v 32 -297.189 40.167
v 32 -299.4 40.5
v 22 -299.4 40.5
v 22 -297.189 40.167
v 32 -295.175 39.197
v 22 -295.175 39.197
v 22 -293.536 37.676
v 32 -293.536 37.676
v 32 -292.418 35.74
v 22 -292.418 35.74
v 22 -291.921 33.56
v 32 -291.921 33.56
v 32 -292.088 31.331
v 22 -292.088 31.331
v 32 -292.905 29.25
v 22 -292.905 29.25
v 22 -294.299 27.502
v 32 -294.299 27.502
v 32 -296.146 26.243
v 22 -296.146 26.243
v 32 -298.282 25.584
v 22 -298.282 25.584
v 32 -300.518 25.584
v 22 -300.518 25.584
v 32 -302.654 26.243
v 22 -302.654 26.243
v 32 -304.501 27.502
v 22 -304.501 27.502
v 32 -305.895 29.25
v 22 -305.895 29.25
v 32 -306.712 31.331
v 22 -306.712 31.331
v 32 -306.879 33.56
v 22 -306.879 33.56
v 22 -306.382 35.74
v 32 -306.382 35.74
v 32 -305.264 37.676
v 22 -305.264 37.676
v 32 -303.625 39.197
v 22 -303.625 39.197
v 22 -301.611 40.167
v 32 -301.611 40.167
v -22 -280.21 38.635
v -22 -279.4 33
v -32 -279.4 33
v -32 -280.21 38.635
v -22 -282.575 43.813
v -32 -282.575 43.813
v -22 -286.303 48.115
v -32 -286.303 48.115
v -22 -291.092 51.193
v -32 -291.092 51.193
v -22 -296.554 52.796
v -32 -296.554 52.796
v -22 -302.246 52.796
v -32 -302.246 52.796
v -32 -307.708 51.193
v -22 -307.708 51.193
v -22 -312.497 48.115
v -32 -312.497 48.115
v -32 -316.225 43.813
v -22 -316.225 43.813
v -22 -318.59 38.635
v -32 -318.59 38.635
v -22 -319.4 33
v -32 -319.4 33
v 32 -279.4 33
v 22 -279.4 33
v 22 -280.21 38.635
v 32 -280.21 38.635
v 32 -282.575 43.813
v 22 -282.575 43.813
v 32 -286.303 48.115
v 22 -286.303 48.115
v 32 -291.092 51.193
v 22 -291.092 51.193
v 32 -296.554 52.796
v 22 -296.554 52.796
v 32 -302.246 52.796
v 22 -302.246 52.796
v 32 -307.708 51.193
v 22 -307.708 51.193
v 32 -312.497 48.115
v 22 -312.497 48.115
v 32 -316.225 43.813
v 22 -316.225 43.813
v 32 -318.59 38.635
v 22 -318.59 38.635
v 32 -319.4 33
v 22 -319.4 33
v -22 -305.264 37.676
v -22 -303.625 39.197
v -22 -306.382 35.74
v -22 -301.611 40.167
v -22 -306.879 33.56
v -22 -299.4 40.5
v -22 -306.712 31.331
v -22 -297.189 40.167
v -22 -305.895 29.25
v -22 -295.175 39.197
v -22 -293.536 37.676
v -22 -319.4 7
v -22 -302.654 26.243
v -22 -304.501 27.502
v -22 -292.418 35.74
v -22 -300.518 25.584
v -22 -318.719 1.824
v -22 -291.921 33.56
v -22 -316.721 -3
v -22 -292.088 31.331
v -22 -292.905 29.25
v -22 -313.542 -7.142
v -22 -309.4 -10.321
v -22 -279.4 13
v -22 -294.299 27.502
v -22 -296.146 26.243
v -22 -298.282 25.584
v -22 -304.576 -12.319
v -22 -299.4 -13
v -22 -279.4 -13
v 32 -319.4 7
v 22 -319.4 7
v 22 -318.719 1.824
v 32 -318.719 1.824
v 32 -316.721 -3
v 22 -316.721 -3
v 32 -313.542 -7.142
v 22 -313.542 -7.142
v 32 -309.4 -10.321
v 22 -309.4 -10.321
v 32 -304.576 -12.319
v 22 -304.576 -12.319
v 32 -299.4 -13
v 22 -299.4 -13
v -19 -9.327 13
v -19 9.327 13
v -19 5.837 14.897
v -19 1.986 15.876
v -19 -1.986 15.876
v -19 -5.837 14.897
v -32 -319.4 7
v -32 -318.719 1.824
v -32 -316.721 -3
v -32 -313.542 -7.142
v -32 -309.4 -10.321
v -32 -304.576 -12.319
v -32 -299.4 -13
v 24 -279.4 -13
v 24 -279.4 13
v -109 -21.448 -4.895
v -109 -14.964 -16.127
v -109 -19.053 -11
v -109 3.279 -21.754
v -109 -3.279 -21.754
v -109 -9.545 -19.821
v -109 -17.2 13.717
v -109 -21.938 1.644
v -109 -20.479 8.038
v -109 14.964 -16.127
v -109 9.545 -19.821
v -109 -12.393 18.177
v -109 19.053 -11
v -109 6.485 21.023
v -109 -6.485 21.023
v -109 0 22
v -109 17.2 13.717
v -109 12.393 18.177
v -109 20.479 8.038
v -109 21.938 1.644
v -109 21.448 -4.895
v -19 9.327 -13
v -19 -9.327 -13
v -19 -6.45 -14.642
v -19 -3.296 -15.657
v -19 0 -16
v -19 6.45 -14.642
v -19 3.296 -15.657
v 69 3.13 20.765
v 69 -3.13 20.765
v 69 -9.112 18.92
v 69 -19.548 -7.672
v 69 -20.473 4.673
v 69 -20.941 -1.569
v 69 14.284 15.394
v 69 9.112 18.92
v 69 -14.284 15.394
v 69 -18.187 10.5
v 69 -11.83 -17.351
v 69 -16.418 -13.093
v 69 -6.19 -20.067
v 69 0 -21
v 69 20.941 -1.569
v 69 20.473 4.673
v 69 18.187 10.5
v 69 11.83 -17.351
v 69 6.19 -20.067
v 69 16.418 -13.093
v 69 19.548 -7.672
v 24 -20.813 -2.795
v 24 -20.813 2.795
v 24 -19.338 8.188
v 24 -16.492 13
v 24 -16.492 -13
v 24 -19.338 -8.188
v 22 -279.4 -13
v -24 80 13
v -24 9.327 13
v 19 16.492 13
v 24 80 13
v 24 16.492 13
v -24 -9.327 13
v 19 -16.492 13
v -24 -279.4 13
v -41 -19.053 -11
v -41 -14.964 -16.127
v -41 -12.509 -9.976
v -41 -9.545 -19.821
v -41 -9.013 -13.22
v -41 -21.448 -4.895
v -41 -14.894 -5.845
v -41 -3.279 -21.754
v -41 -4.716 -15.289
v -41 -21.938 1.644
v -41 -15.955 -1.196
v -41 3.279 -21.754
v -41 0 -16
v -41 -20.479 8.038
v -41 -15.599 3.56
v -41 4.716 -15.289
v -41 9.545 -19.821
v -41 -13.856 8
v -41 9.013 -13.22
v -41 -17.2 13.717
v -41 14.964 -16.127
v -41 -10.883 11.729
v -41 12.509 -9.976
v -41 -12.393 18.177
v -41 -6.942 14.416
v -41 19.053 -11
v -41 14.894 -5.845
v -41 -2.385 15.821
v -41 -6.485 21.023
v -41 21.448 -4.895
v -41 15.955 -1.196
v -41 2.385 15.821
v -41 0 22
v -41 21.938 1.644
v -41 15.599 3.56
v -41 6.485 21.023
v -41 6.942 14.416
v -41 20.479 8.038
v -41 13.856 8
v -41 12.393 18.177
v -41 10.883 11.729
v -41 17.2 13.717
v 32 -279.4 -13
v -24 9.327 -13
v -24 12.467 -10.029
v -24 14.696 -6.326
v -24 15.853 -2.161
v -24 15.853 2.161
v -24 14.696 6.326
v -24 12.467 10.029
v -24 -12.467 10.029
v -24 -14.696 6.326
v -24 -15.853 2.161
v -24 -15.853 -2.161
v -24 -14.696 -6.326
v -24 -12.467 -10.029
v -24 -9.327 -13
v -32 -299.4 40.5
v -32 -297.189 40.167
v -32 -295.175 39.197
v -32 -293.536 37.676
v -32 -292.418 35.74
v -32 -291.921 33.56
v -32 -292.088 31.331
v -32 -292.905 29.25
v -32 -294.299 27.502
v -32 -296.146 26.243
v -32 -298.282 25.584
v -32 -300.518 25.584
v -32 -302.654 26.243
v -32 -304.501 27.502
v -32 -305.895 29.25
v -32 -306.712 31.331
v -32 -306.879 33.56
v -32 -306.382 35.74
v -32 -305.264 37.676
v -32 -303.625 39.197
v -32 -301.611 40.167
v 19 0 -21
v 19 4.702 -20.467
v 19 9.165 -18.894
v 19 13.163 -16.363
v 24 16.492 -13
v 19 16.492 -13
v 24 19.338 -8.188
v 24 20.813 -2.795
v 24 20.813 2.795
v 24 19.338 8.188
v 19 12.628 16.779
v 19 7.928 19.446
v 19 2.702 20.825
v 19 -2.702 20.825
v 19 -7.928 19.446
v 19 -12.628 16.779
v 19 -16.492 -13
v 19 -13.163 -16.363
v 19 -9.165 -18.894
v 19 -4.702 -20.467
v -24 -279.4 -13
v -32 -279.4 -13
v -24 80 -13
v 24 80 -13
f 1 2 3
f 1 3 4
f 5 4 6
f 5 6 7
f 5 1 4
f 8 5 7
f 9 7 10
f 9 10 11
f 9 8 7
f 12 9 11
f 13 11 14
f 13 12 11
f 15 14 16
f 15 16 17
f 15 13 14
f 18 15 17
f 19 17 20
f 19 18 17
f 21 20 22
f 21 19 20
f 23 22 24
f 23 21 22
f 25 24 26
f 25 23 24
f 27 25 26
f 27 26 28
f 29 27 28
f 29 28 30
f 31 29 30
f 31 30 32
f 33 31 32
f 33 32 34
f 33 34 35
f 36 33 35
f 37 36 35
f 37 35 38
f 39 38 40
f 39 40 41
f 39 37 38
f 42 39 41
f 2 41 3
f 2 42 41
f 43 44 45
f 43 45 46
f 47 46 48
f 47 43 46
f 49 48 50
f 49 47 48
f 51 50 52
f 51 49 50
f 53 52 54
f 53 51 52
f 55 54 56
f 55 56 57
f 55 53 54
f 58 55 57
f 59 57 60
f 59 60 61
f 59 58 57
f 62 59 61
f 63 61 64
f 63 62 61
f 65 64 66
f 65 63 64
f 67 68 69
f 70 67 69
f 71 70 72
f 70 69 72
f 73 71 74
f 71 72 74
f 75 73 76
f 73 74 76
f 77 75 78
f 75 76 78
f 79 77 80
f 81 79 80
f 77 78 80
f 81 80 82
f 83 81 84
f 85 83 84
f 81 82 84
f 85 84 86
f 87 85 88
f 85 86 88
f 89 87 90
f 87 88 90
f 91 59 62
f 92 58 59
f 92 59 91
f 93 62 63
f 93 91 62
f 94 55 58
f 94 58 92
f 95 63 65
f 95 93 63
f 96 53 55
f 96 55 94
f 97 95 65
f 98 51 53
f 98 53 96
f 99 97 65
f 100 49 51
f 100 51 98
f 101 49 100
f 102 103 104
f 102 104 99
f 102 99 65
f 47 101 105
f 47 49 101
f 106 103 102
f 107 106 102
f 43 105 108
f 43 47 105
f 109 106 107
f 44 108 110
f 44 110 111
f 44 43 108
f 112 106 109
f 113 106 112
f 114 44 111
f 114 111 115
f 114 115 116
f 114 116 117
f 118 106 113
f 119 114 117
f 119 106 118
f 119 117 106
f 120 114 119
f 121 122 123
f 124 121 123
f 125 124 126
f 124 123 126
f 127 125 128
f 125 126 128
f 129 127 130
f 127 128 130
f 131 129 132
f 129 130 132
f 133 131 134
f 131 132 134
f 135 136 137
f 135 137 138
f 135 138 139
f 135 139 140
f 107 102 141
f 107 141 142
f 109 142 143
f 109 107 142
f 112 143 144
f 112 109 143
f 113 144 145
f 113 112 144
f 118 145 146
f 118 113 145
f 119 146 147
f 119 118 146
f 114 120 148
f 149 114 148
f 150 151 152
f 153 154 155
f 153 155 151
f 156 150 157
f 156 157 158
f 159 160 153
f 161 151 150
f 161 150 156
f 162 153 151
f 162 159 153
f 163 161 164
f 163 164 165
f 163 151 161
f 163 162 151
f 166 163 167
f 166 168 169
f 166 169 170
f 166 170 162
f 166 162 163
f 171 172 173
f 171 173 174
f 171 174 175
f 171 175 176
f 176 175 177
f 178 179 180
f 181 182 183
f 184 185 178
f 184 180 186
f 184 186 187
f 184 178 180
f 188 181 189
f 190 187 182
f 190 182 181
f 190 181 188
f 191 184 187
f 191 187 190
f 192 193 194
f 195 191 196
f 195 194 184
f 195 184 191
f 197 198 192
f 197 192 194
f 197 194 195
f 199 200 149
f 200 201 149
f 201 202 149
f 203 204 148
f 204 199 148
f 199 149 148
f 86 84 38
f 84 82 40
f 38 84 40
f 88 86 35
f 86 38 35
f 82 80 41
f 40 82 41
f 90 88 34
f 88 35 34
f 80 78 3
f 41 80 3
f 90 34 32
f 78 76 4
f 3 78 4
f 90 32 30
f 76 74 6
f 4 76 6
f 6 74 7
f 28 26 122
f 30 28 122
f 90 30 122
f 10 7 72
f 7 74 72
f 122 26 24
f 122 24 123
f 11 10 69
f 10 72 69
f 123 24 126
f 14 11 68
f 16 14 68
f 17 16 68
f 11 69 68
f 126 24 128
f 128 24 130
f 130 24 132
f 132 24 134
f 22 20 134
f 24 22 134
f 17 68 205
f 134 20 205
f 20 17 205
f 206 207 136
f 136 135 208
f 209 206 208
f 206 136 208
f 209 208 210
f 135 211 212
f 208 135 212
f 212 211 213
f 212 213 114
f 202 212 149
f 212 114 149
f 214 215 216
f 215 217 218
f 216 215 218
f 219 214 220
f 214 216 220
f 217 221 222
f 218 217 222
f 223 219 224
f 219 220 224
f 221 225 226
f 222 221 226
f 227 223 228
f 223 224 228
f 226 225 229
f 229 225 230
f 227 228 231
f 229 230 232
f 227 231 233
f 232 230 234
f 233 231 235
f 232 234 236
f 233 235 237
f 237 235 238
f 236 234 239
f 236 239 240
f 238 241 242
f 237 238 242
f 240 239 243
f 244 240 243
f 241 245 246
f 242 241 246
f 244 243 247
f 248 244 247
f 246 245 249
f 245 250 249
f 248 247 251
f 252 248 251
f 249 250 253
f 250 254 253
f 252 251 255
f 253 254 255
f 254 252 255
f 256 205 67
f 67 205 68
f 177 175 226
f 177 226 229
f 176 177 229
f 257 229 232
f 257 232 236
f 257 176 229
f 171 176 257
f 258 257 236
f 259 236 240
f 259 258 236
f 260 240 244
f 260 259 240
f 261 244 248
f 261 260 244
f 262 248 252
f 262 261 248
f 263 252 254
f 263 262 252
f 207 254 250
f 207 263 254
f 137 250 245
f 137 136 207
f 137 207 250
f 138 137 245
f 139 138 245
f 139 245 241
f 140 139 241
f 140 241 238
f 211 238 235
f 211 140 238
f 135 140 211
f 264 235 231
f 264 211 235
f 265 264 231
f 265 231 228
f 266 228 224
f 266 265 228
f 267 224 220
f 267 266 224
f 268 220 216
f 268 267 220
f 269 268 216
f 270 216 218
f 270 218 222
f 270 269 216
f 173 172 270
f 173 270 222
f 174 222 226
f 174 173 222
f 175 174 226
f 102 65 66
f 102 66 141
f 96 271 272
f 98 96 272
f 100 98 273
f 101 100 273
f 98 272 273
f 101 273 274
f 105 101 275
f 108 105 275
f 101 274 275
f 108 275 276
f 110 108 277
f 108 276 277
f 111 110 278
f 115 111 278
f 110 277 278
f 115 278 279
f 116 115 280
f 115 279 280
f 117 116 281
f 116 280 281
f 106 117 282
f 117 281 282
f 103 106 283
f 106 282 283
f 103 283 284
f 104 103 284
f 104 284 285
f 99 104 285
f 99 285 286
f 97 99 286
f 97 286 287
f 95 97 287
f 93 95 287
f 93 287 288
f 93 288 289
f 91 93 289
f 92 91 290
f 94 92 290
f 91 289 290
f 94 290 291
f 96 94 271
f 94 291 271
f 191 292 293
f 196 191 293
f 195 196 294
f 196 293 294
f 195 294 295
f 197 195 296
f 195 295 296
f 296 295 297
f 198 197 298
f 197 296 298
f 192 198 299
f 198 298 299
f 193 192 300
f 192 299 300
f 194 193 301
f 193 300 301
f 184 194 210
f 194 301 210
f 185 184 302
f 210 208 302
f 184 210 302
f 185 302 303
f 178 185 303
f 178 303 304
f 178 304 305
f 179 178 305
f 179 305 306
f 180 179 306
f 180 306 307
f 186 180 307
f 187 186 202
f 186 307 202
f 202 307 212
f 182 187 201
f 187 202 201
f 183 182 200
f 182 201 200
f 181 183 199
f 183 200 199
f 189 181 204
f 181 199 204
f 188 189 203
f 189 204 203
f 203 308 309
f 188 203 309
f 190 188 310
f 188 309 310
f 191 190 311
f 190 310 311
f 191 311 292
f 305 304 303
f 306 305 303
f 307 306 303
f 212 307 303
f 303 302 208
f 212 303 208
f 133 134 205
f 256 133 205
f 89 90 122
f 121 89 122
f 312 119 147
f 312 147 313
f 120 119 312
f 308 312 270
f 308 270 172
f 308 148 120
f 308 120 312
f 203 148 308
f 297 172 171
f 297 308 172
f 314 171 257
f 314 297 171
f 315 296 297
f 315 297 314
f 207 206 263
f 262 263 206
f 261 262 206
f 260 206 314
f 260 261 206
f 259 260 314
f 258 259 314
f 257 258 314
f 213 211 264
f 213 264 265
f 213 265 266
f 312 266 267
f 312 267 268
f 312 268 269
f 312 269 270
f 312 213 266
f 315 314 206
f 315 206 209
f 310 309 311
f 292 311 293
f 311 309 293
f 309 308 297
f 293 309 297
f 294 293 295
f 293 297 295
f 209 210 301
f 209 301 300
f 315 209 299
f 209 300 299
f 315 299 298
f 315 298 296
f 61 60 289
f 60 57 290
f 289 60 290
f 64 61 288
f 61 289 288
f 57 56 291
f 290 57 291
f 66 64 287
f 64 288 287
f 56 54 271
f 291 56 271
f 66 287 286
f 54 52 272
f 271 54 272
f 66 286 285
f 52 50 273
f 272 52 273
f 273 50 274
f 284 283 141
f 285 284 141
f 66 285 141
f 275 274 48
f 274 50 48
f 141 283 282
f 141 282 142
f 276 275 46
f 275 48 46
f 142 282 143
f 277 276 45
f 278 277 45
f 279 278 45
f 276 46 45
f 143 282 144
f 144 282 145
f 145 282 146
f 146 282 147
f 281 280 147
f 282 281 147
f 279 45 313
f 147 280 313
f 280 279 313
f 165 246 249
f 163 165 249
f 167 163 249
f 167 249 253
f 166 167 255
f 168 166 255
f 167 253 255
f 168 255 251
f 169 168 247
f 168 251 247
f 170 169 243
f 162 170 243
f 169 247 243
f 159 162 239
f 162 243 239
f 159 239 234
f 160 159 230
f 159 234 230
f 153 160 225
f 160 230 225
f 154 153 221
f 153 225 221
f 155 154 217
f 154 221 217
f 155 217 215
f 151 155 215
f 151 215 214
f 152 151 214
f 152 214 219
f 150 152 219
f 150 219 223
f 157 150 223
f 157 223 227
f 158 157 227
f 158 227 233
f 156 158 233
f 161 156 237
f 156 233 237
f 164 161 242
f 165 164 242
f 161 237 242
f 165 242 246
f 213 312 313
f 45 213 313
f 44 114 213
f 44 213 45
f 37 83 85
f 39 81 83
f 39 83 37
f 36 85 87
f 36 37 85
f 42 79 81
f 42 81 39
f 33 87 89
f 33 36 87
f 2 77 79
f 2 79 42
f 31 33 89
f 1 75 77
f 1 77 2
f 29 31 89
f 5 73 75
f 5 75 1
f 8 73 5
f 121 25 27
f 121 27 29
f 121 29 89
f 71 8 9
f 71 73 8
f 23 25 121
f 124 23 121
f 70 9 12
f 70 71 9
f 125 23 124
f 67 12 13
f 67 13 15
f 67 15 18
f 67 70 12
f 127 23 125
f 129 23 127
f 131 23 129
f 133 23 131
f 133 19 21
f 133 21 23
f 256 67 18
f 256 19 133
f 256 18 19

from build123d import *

# Parameters (mm, degrees)
SKETCH3_R                = 16
BOSS_EXTRUDE1_DEPTH      = 22
SKETCH4_R                = 22
BOSS_EXTRUDE2_DEPTH      = 68
SKETCH2_R                = 21
BOSS_EXTRUDE3_DEPTH      = 50
BOSS_EXTRUDE5_DEPTH      = 80
BOSS_EXTRUDE5_DEPTH_BACK = 279.4
SKETCH1_W                = 48
SKETCH1_H                = 26
BOSS_EXTRUDE7_START      = -2
BOSS_EXTRUDE7_DEPTH      = 10
CUT_EXTRUDE4_START       = -10
SKETCH10_R               = 7.5
CUT_EXTRUDE4_DEPTH       = 10


with BuildPart() as part:
    # Sketch3 → Boss-Extrude1 (new body)
    with BuildSketch(Plane(origin=(-19, 0, 0), x_dir=(0, 0, -1), z_dir=(1, 0, 0))):
        Circle(SKETCH3_R)
    extrude(amount=-BOSS_EXTRUDE1_DEPTH)

    # Sketch4 → Boss-Extrude2 (add)
    with BuildSketch(Plane.ZY.offset(41)):
        Circle(SKETCH4_R)
    extrude(amount=BOSS_EXTRUDE2_DEPTH)



with BuildPart() as body_2:
    # Sketch2 → Boss-Extrude3 (new body)
    with BuildSketch(Plane(origin=(19, 0, 0), x_dir=(0, 0, -1), z_dir=(1, 0, 0))):
        Circle(SKETCH2_R)
    extrude(amount=BOSS_EXTRUDE3_DEPTH)


with BuildPart() as part_1:
    add(part.part)

    add(body_2.part)  # Boss-Extrude5 merges body 2
    # Sketch1 → Boss-Extrude5 (add, two sides: drawn at the far end of the back side and taken through both)
    with BuildSketch(Plane(origin=(0, 0, 0), x_dir=(1, 0, 0), z_dir=(0, 1, 0)).offset(-BOSS_EXTRUDE5_DEPTH_BACK)):
        Rectangle(SKETCH1_W, SKETCH1_H)
    extrude(amount=BOSS_EXTRUDE5_DEPTH + BOSS_EXTRUDE5_DEPTH_BACK)


with BuildPart() as body_2_2:
    # Sketch5 → Boss-Extrude7 (new body)
    with BuildSketch(Plane(origin=(24, 0, 0), x_dir=(0, 0, -1), z_dir=(1, 0, 0)).offset(BOSS_EXTRUDE7_START)):
        with BuildLine():
            Line((13, -279.4), (-33, -279.4))
            ThreePointArc((-33, -279.4), (-53, -299.4), (-33, -319.4))
            Line((-33, -319.4), (-7, -319.4))
            ThreePointArc((-7, -319.4), (7.142135624, -313.542135624), (13, -299.4))
            Line((13, -299.4), (13, -279.4))
        make_face()
    boss_extrude7 = extrude(amount=BOSS_EXTRUDE7_DEPTH)

    # Sketch10 → Cut-Extrude4 (cut)
    with BuildSketch(Plane.ZY.offset(-22).offset(CUT_EXTRUDE4_START)):
        with Locations((33, -299.4)):
            Circle(SKETCH10_R)
    cut_extrude4 = extrude(amount=CUT_EXTRUDE4_DEPTH, mode=Mode.SUBTRACT)


with BuildPart() as part_2:
    add(part_1.part)

    # Mirror26: Boss-Extrude7, Cut-Extrude4 across plane
    add(boss_extrude7.mirror(Plane(origin=(0, 0, 0), x_dir=(0, 0, 1), z_dir=(1, 0, 0))))
    add(cut_extrude4.mirror(Plane(origin=(0, 0, 0), x_dir=(0, 0, 1), z_dir=(1, 0, 0))), mode=Mode.SUBTRACT)


solid = Compound([body_2_2.part, part_2.part])
